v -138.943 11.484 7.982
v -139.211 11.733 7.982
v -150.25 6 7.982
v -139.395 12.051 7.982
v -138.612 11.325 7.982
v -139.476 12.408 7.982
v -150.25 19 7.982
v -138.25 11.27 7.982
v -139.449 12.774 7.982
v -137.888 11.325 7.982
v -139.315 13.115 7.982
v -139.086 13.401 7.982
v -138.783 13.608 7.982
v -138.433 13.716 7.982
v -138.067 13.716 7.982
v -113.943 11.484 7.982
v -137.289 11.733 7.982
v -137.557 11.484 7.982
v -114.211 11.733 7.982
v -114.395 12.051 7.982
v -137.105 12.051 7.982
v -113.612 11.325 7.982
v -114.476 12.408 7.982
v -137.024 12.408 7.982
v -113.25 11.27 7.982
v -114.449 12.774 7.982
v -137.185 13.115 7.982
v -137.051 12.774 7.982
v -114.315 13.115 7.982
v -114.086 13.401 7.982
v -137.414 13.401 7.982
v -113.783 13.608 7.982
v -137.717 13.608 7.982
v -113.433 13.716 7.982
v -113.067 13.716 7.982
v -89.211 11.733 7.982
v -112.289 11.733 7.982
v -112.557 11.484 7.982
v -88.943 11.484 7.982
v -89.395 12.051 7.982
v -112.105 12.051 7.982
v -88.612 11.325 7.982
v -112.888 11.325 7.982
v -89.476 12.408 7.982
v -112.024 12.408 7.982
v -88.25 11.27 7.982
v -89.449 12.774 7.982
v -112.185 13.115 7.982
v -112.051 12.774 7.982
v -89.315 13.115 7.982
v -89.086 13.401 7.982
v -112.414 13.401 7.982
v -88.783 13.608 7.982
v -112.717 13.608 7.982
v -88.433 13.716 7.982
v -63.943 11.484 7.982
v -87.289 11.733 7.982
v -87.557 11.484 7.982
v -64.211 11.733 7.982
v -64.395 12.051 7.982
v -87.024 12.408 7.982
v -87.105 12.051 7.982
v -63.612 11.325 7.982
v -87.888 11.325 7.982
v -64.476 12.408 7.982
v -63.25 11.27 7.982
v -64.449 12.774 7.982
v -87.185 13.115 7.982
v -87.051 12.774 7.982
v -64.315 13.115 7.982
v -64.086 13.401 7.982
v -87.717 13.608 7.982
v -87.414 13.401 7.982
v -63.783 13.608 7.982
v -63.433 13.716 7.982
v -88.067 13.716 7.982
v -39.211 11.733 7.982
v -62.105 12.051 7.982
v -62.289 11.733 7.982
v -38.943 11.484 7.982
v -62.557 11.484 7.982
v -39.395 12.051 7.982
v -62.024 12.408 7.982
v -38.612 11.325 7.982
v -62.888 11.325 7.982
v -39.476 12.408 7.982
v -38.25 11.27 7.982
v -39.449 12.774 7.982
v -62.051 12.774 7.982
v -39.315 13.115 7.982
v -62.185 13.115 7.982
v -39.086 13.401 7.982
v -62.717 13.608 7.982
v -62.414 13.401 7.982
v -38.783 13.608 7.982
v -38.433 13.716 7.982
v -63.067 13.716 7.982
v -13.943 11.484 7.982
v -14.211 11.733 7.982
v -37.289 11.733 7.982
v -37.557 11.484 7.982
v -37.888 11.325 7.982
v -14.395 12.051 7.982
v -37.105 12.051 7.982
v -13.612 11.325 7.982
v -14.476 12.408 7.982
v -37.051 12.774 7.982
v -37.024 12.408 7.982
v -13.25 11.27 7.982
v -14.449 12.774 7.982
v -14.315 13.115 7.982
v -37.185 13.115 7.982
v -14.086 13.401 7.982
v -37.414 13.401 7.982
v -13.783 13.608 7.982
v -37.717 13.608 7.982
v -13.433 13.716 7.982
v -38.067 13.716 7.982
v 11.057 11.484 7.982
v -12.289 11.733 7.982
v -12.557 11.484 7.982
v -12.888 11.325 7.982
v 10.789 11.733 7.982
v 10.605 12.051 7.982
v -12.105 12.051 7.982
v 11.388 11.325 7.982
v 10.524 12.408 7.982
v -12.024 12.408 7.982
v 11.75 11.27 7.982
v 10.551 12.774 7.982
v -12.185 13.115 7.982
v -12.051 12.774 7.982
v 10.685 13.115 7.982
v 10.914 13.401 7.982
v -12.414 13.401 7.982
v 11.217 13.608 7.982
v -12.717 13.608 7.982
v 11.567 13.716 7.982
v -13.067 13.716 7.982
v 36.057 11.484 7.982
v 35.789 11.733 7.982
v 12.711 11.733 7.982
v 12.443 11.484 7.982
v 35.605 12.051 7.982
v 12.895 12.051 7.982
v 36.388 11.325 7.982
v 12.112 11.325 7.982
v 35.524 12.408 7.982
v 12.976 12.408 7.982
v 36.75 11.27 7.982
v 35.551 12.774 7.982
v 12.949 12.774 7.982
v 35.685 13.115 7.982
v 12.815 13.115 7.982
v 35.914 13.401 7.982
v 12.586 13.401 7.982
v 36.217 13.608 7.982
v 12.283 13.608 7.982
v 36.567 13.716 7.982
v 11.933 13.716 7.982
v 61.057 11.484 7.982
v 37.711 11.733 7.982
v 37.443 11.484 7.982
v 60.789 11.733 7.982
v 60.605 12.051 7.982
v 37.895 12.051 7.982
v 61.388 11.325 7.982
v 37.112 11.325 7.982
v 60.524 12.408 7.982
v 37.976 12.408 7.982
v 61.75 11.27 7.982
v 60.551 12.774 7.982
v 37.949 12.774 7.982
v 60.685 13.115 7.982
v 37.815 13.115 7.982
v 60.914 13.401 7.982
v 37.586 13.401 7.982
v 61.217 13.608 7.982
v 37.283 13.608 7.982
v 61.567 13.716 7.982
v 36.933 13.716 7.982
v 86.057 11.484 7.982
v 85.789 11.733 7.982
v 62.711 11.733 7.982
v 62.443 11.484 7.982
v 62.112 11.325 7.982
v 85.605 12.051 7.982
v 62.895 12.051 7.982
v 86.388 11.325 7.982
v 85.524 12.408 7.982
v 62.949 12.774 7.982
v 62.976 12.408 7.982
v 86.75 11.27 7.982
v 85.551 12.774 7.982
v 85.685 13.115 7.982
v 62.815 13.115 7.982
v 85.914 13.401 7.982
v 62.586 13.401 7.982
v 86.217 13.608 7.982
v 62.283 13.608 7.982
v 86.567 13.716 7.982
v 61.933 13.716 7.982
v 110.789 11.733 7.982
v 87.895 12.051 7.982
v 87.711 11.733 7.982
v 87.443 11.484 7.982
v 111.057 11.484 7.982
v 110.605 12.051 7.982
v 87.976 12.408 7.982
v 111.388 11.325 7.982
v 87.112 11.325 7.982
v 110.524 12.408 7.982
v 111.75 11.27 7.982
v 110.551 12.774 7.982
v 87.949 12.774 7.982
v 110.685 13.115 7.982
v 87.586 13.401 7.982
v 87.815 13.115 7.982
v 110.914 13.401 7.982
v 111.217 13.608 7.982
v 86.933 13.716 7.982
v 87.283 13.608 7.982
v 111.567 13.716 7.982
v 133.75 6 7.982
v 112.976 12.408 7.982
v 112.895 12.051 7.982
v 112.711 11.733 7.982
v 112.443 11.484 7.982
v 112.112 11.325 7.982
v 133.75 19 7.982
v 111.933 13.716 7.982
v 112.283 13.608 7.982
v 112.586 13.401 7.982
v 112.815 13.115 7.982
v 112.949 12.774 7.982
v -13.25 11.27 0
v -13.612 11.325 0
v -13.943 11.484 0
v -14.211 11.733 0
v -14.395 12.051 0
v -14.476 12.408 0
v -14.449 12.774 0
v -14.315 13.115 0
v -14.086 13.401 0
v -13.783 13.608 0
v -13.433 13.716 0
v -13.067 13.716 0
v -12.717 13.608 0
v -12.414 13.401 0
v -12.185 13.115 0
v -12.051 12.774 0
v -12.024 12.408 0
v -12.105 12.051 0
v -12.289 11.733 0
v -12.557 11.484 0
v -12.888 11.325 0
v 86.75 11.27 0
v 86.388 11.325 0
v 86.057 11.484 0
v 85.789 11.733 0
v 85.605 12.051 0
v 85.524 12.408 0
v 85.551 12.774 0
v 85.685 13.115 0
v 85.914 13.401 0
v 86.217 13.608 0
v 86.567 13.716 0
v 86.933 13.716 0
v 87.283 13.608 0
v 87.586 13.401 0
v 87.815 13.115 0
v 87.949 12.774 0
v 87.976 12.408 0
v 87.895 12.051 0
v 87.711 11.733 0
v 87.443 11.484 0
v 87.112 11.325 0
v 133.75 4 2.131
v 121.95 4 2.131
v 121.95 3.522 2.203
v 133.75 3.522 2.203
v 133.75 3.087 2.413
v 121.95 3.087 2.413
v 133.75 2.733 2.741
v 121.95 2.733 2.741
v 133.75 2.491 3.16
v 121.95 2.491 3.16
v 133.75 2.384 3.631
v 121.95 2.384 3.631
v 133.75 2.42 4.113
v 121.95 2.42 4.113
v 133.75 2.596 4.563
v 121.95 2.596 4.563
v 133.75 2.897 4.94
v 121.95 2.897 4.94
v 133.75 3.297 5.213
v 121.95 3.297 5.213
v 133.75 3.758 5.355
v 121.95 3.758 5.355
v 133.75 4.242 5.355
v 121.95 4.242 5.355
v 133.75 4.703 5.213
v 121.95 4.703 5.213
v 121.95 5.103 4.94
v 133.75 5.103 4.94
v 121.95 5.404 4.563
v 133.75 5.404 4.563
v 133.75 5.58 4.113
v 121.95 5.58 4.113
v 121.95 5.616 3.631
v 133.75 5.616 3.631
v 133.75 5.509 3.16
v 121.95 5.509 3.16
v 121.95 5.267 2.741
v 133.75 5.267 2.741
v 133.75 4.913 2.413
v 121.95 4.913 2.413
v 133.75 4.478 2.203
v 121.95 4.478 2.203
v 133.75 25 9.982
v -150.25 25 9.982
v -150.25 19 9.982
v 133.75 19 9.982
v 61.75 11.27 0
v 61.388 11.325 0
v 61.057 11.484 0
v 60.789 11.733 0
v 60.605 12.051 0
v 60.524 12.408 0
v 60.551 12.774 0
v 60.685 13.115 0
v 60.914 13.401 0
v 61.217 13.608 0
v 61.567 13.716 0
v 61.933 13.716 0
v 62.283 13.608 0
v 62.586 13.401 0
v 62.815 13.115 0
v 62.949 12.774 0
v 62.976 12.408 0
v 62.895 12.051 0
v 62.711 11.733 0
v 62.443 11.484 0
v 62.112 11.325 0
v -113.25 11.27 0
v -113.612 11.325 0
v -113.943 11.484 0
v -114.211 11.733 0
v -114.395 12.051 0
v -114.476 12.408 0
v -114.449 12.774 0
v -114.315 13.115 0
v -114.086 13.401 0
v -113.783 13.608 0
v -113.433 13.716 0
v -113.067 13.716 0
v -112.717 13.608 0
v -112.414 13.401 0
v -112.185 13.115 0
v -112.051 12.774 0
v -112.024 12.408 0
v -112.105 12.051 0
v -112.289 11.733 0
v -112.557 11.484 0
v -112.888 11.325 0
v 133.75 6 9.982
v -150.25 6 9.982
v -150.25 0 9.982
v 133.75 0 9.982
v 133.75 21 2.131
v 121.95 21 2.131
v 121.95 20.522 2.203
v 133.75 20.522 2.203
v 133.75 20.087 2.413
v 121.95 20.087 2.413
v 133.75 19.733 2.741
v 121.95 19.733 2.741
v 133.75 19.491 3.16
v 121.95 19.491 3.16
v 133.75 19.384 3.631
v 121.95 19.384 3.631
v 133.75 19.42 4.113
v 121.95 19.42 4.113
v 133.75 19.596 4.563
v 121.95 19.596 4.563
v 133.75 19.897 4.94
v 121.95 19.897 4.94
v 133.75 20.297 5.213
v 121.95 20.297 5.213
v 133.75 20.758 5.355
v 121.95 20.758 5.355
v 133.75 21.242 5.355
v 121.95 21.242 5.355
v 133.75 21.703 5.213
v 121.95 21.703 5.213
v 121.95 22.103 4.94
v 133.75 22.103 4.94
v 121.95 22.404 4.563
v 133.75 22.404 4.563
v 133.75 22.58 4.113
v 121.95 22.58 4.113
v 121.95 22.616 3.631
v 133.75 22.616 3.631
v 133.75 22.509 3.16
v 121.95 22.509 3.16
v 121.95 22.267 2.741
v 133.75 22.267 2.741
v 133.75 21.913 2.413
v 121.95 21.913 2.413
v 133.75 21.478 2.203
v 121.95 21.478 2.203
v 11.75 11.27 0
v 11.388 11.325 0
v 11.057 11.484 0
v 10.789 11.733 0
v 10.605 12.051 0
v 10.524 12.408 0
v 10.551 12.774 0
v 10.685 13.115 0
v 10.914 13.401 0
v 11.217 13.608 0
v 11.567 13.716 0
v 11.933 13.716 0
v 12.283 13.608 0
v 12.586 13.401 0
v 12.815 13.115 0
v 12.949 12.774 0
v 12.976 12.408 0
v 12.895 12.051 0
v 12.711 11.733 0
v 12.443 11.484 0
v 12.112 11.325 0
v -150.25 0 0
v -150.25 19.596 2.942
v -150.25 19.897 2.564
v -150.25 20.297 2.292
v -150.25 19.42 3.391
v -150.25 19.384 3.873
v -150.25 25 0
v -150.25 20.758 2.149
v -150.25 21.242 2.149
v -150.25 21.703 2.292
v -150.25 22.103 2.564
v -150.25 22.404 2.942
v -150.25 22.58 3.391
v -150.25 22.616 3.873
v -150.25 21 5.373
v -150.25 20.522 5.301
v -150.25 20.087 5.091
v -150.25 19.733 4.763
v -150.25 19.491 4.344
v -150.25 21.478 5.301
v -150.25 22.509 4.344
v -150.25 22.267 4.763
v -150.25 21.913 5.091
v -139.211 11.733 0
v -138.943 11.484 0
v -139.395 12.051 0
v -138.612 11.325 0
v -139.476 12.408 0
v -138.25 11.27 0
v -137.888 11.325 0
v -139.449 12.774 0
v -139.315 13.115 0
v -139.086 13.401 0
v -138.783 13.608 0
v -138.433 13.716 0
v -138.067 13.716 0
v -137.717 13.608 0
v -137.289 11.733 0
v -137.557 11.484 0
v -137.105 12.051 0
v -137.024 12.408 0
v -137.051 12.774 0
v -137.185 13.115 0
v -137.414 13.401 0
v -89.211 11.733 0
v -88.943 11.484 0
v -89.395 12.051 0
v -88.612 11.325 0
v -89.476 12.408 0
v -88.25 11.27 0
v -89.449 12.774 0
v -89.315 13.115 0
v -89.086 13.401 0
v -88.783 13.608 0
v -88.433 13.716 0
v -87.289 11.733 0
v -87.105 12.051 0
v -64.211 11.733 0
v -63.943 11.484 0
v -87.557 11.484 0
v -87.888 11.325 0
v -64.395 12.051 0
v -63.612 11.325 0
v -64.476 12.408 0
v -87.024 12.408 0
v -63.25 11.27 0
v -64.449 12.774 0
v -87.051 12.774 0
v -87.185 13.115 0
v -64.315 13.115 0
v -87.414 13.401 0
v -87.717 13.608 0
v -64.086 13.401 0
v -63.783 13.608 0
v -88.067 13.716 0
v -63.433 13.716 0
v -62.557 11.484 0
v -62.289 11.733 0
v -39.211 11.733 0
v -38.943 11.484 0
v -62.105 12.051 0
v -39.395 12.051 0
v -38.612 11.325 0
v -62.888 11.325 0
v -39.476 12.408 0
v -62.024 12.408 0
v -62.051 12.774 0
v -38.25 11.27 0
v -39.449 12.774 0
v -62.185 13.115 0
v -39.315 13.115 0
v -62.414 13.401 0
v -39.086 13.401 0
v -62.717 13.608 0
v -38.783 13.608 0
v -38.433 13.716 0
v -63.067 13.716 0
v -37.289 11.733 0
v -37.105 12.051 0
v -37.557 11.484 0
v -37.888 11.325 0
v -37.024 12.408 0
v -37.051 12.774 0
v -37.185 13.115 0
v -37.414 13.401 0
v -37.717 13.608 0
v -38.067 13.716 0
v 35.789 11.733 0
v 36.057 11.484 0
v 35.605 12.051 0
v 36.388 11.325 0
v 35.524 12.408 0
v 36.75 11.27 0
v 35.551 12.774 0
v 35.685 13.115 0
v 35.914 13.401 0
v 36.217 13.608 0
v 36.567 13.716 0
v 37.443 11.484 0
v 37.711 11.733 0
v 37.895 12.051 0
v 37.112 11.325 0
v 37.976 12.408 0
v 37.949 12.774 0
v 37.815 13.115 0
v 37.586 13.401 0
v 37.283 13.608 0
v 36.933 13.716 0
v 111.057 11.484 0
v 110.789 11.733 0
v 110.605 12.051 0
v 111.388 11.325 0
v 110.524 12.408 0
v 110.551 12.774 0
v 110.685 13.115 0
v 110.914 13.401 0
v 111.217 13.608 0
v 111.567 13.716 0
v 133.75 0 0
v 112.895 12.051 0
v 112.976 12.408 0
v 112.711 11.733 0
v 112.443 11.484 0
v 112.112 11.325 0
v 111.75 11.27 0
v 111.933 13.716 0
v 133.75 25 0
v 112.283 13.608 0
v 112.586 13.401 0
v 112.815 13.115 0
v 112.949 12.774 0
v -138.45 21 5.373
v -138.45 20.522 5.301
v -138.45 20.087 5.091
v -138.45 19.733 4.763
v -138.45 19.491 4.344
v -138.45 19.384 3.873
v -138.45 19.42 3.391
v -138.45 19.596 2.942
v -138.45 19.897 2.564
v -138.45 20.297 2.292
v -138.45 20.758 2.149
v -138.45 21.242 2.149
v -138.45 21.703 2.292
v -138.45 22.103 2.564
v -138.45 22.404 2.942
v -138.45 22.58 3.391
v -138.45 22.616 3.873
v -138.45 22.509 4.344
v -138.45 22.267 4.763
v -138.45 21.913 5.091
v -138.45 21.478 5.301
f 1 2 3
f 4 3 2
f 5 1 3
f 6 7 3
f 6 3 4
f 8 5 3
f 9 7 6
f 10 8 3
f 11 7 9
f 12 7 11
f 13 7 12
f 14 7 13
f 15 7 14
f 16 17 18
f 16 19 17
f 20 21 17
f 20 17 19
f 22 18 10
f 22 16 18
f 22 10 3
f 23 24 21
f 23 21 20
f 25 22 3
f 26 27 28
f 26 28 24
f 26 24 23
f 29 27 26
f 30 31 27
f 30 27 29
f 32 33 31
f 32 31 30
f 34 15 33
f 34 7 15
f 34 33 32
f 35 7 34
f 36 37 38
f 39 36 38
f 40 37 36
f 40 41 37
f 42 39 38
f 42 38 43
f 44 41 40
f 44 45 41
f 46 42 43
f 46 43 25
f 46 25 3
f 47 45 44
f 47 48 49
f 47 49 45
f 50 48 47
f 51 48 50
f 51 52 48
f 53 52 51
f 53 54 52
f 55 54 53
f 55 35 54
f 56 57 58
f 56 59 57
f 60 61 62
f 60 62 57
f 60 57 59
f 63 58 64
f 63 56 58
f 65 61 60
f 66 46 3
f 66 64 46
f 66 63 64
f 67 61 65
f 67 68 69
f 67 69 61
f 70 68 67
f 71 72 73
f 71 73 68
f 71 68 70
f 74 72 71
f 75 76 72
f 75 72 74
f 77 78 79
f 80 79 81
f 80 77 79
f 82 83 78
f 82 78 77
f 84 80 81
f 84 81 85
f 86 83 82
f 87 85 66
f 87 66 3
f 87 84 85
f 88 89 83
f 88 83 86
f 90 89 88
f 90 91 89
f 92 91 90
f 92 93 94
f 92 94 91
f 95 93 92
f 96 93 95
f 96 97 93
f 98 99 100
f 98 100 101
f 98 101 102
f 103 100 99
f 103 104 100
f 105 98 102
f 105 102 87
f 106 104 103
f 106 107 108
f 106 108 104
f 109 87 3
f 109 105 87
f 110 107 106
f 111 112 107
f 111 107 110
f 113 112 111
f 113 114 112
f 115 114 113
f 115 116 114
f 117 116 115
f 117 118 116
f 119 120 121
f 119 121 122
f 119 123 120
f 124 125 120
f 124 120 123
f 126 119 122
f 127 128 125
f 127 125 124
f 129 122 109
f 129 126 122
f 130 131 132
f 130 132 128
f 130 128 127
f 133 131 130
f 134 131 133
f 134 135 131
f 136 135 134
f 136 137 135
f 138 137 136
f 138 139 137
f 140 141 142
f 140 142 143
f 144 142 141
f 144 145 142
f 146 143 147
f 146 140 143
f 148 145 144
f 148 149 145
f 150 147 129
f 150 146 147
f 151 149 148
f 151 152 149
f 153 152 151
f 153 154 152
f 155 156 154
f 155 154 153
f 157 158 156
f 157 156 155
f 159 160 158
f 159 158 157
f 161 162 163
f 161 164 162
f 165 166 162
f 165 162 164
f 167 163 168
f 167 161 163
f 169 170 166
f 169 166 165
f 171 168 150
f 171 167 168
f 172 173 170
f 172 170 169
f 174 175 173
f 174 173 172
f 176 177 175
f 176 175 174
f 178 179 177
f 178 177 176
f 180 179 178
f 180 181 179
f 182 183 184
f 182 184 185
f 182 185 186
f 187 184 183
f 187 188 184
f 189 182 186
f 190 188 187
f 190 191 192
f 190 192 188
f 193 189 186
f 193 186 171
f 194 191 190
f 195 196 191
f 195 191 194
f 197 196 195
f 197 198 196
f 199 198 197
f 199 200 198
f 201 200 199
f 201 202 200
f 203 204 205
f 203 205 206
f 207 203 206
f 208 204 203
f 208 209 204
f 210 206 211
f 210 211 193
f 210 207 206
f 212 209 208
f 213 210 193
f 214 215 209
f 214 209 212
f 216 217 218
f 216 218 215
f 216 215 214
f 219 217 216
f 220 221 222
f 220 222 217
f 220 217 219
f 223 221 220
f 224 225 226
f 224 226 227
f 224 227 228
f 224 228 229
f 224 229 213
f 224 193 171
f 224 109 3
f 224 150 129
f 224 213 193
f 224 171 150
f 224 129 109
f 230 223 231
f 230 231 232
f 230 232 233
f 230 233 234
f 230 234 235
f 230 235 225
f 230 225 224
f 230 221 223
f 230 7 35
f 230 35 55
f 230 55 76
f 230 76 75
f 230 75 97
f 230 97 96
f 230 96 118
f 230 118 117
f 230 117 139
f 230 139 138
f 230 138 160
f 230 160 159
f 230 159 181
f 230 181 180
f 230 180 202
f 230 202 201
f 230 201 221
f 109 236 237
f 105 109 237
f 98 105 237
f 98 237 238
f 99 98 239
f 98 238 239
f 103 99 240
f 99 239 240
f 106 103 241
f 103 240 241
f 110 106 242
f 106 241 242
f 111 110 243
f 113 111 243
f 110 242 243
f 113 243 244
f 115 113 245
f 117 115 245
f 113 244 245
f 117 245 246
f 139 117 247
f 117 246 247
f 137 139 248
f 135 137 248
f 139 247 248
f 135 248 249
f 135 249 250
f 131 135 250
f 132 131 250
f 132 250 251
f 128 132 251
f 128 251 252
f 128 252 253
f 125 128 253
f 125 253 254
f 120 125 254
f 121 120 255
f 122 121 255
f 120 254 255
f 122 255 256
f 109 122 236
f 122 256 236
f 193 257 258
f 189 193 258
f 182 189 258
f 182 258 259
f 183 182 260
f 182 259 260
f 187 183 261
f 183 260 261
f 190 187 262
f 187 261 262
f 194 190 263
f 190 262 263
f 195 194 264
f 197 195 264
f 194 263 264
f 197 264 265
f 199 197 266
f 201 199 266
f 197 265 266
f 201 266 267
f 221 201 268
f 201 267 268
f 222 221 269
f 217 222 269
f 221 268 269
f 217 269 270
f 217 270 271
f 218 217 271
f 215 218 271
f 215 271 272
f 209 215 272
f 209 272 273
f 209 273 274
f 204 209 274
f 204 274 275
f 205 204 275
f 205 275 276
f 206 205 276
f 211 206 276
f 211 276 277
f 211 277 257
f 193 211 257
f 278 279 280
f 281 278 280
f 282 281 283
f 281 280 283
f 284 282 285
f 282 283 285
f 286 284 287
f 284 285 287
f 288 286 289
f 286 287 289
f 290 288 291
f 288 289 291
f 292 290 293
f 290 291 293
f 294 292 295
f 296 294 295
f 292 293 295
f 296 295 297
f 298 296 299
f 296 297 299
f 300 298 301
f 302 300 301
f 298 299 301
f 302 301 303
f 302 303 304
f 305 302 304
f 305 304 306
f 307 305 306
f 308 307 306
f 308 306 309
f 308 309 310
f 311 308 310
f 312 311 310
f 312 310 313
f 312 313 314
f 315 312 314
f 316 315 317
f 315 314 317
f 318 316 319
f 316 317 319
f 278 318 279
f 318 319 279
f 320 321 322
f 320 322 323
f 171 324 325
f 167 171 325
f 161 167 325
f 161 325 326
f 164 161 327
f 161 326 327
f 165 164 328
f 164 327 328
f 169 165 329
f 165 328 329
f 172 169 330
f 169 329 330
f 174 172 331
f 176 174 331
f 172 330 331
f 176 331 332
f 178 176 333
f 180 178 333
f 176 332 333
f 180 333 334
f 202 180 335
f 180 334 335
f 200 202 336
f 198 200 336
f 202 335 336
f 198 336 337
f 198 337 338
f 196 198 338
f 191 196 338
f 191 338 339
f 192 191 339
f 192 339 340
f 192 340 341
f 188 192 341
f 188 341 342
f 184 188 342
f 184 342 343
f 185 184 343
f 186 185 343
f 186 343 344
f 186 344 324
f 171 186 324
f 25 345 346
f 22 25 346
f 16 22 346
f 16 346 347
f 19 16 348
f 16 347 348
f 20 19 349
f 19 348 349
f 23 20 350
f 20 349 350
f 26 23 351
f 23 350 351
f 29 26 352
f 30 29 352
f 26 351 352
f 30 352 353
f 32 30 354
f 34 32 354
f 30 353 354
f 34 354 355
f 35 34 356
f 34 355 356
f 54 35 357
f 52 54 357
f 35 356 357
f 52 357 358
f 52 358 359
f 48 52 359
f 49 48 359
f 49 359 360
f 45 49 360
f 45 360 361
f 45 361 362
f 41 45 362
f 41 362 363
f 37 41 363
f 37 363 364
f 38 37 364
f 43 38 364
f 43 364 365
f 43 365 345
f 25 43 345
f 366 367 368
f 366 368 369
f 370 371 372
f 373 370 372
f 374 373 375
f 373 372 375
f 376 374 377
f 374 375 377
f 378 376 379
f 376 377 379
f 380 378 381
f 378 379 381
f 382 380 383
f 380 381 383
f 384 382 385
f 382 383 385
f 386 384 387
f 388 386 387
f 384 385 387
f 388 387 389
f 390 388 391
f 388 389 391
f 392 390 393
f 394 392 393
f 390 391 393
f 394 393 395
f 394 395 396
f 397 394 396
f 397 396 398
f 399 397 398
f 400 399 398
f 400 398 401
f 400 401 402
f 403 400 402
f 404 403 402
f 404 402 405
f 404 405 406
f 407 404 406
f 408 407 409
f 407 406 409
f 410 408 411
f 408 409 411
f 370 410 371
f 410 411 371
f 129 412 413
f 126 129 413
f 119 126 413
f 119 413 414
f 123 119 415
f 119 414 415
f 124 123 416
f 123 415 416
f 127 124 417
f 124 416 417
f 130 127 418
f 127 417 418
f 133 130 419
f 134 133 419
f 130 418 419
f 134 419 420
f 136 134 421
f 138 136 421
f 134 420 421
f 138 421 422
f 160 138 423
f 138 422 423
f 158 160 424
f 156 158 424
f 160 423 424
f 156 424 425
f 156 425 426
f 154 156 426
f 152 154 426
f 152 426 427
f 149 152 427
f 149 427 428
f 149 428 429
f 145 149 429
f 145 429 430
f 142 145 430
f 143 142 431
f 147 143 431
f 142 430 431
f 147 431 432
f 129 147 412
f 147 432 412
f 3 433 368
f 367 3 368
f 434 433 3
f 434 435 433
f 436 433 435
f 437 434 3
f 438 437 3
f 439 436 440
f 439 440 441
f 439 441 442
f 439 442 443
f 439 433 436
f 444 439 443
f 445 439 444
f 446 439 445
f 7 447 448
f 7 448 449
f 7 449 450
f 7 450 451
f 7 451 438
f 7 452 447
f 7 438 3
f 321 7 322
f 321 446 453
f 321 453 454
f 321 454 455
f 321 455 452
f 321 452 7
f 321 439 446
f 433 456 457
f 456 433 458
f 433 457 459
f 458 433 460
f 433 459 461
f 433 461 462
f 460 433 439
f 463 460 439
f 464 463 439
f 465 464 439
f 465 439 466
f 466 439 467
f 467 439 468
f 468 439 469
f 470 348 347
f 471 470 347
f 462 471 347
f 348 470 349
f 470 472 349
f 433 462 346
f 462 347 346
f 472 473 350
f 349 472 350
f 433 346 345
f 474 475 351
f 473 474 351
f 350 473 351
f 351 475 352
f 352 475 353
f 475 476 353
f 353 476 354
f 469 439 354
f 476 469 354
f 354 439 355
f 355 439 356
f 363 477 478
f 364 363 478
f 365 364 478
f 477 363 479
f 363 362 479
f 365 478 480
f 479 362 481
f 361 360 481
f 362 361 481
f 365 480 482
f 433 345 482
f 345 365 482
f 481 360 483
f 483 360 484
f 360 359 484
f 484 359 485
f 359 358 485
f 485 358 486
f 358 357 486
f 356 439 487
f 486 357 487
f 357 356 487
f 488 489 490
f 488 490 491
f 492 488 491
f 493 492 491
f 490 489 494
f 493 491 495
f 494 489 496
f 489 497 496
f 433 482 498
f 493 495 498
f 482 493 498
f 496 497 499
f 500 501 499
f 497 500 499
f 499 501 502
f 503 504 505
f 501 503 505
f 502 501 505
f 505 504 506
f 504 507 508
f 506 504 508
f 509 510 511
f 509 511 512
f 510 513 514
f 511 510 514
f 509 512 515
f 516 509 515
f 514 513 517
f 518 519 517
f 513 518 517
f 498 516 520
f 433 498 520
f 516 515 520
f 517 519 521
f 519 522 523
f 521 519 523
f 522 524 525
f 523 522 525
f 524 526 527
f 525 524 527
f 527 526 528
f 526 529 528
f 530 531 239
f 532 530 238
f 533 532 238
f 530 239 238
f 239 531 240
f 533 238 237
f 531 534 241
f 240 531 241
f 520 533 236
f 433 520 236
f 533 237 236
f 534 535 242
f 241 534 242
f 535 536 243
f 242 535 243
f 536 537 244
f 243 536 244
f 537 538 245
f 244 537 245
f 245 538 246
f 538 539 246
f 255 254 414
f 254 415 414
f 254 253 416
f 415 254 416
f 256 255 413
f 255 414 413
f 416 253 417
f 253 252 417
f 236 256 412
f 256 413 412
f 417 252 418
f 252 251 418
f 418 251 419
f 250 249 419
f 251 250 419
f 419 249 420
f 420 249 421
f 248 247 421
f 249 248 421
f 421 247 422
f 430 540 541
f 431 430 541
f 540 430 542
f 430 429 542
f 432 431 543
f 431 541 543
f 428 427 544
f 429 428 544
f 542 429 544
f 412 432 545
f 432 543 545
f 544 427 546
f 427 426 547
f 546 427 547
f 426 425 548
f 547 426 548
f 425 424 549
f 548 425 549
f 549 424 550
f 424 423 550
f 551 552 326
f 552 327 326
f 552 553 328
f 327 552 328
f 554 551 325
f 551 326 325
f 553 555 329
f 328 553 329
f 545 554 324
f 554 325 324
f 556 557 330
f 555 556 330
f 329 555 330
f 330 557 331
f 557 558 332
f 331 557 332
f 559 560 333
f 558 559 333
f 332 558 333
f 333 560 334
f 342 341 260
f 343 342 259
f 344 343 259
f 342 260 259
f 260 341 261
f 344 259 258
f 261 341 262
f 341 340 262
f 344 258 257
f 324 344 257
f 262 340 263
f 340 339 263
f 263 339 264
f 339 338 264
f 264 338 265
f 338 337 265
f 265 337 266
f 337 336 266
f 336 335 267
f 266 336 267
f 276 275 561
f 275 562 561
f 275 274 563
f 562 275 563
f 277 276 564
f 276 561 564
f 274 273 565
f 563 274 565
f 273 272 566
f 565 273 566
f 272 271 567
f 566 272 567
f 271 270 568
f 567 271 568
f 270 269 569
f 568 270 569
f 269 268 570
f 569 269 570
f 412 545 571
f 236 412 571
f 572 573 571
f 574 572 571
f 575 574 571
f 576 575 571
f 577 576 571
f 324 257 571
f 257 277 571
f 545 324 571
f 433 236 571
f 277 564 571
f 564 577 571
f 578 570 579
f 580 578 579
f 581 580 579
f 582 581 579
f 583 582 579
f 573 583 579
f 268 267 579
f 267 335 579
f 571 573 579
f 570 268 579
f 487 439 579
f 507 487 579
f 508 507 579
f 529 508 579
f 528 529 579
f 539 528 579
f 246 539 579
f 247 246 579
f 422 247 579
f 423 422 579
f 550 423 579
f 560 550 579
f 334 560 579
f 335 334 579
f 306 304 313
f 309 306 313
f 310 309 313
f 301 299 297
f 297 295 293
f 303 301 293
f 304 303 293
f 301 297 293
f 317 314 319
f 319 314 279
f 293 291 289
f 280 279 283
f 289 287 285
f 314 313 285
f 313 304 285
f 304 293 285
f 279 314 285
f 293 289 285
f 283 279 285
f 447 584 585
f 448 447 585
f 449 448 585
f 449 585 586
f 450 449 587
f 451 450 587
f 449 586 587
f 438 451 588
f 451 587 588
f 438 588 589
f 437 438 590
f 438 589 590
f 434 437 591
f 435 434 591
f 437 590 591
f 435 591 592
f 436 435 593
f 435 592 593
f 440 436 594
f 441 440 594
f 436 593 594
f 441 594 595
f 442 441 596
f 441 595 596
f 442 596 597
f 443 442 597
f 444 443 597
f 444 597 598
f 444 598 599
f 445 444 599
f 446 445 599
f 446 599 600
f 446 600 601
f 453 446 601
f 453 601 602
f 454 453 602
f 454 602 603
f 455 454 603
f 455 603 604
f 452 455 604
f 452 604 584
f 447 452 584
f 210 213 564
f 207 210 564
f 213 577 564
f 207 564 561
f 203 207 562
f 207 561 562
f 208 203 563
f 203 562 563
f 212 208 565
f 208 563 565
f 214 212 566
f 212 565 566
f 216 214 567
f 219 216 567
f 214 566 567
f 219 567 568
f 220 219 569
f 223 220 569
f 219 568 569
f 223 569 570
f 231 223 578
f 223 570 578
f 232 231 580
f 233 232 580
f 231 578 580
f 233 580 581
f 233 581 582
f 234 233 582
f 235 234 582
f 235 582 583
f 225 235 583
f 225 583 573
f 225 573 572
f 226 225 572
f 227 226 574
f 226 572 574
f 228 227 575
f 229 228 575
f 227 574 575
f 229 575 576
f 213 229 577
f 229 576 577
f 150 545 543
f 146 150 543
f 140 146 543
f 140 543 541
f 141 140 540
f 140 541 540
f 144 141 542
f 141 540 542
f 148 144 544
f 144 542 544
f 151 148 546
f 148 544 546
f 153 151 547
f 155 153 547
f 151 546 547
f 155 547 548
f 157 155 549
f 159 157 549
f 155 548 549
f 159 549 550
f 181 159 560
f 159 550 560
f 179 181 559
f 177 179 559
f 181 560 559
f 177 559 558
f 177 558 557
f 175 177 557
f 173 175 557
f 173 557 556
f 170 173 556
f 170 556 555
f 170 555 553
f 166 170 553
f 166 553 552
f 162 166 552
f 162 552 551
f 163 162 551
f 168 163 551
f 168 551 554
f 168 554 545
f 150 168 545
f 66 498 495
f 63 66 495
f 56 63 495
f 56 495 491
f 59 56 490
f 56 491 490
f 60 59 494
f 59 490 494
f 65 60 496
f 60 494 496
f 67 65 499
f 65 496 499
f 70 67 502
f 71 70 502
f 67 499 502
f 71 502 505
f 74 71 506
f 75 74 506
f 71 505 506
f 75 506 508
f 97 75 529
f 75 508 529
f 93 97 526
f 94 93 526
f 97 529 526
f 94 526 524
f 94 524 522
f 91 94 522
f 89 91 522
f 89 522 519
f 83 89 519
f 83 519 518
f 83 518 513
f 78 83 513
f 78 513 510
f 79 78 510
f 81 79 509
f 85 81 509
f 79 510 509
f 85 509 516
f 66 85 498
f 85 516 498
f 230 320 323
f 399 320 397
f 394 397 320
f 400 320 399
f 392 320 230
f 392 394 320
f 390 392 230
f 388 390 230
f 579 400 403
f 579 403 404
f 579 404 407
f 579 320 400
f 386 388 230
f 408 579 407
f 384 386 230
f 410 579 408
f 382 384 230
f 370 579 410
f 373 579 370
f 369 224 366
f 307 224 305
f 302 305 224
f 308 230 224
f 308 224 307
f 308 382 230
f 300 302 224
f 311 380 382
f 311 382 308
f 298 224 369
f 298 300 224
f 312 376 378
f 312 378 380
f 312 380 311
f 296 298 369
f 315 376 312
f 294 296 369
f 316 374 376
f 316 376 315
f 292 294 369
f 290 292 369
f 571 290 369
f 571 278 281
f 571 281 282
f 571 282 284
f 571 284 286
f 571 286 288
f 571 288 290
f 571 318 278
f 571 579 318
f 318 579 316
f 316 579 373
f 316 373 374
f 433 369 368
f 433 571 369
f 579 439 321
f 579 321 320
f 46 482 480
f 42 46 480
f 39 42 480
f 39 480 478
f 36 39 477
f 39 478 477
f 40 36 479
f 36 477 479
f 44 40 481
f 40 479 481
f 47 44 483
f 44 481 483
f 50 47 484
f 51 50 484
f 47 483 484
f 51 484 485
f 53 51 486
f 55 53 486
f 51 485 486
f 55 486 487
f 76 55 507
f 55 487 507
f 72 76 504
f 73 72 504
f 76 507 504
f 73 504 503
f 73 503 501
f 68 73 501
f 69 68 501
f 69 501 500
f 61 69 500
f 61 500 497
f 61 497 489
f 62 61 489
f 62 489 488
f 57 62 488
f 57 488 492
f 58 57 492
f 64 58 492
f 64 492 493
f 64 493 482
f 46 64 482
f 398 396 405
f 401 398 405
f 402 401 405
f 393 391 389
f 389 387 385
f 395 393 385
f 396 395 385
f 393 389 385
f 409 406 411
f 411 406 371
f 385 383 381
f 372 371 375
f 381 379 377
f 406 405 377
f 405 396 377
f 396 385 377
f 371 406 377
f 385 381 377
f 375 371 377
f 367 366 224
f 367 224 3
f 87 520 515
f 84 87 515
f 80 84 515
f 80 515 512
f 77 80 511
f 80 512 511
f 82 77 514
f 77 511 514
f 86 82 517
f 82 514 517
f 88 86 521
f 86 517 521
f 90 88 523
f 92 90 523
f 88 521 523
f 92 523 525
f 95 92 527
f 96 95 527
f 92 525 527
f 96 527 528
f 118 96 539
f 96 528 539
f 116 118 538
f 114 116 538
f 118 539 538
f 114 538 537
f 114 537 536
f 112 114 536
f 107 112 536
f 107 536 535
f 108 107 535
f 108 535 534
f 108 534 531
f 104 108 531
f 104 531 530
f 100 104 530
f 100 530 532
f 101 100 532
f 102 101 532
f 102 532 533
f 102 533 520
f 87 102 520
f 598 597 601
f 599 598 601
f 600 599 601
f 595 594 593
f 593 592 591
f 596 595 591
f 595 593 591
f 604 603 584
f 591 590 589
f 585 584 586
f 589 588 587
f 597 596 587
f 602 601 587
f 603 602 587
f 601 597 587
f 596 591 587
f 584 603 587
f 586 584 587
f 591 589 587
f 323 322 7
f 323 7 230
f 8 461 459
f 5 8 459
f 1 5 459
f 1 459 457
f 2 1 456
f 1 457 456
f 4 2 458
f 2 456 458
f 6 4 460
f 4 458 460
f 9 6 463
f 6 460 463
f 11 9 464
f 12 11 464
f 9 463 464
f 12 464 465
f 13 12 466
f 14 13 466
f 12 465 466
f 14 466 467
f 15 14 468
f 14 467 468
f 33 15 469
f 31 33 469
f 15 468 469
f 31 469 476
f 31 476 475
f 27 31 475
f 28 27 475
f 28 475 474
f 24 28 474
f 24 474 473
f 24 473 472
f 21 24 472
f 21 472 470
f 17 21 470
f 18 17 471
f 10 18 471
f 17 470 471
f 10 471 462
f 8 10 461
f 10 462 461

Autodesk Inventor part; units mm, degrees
ref_plane "YZ Plane" through (0, 0, 0) normal (1, 0, 0) x (0, 1, 0)
ref_plane "XZ Plane" through (0, 0, 0) normal (0, 1, 0) x (-1, 0, 0)
ref_plane "XY Plane" through (0, 0, 0) normal (0, 0, 1) x (1, 0, 0)
sketch "Sketch1" plane through (0, 0, 0) normal (0, 0, 1) x (1, 0, 0)
  line L0 (127.75, 2.5629) -> (108.85, 2.5629) construction
  line L1 (-186.25, 0) -> (133.75, 0) construction
  line L2 (133.75, 0) -> (133.75, 5) construction
  line L3 (-186.25, 5) -> (133.75, 5) construction
  line L4 (-186.25, 0) -> (-186.25, 5) construction
  line L5 (133.75, 0) -> (-186.25, 0)
  line L6 (-186.25, 0) -> (-186.25, 25)
  line L7 (-186.25, 25) -> (133.75, 25)
  line L8 (133.75, 25) -> (133.75, 0)
  line L9 (-186.25, 0) -> (-186.25, 5)
  dimension "d1" = 25
extrude "Extrusion1" add sketch "Sketch1" along normal blind 9.9823
sketch "Sketch2" plane through (-186.25, 0, 0) normal (-1, 0, 0) x (0, 0, 1)
  line L0 (0, 0) -> (0, 25) projected
  line L1 (0, 0) -> (9.9823, 0) projected
  line L2 (9.9823, 25) -> (9.9823, 0) projected
  line L3 (0, 25) -> (9.9823, 25) projected
  point P0 (0, 0)
extrude "Extrusion2" cut sketch "Sketch2" against normal blind 36
sketch "Sketch3" plane through (0, 0, 9.9823) normal (0, 0, 1) x (1, 0, 0)
  line L0 (-157.75, 6.5) -> (141.25, 6.5)
  line L1 (141.25, 18.5) -> (-157.75, 18.5)
  line L2 (-150.25, 25) -> (-150.25, 0) projected
  line L3 (133.75, 0) -> (133.75, 25) projected
  line L4 (-150.25, 19) -> (133.75, 19)
  line L5 (133.75, 19) -> (133.75, 6)
  line L6 (133.75, 6) -> (-150.25, 6)
  line L7 (-150.25, 6) -> (-150.25, 19)
  point P0 (0, 0)
  dimension "d6" = 0.5
  dimension "d7" = 0.5
extrude "Extrusion3" cut sketch "Sketch3" against normal blind 2
sketch "Sketch4" plane through (133.75, 0, 0) normal (1, 0, 0) x (0, 0, -1)
  circle A0 centre (-3.7521, 4) radius 1.7
  circle A1 centre (-3.7521, 21) radius 1.7
  point P0 (0, 0)
hole "Hole1" at (133.75, 4, 3.7521) at (133.75, 21, 3.7521) direction (-1, 0, 0) diameter 3.242 depth 11.8 thread size "M4x0.7" class "6H" standard "ISO Metric profile"
sketch "Sketch5" plane through (-150.25, 0, 0) normal (-1, 0, 0) x (0, 0, 1)
  circle A0 centre (3.7521, 21) radius 1.7 projected
  circle A1 centre (3.7521, 4) radius 1.7 projected
  point P0 (0, 0)
  point P1 (3.026, 2.4629)
  point P2 (3.026, 5.5371)
hole "Hole2" at (-150.25, 21, 3.7521) direction (1, 0, 0) diameter 3.242 depth 11.8 thread size "M4x0.7" class "6H" standard "ISO Metric profile"
sketch "Sketch6" plane through (0, 0, 7.9823) normal (0, 0, 1) x (1, 0, 0)
  circle A0 centre (-138.25, 12.5) radius 1.7 construction
  circle A1 centre (-113.25, 12.5) radius 1.7 construction
  circle A2 centre (-88.25, 12.5) radius 1.75 construction
  circle A3 centre (-63.25, 12.5) radius 1.75 construction
  circle A4 centre (-38.25, 12.5) radius 1.75 construction
  circle A5 centre (-13.25, 12.5) radius 1.75 construction
  circle A6 centre (11.75, 12.5) radius 1.75 construction
  circle A7 centre (36.75, 12.5) radius 3 construction
  circle A8 centre (61.75, 12.5) radius 3 construction
  circle A9 centre (86.75, 12.5) radius 3 construction
  circle A10 centre (111.75, 12.5) radius 3 construction
  point P0 (0, 0)
hole "Hole3" at (-138.25, 12.5, 7.9823) at (-113.25, 12.5, 7.9823) at (-88.25, 12.5, 7.9823) at (-63.25, 12.5, 7.9823) at (-38.25, 12.5, 7.9823) at (-13.25, 12.5, 7.9823) at (11.75, 12.5, 7.9823) at (36.75, 12.5, 7.9823) at (61.75, 12.5, 7.9823) at (86.75, 12.5, 7.9823) at (111.75, 12.5, 7.9823) direction (0, 0, -1) diameter 2.459 end through all thread size "M3x0.5" class "6H" standard "ISO Metric profile"
properties part number "Y table support" material "Aluminum 6061"
